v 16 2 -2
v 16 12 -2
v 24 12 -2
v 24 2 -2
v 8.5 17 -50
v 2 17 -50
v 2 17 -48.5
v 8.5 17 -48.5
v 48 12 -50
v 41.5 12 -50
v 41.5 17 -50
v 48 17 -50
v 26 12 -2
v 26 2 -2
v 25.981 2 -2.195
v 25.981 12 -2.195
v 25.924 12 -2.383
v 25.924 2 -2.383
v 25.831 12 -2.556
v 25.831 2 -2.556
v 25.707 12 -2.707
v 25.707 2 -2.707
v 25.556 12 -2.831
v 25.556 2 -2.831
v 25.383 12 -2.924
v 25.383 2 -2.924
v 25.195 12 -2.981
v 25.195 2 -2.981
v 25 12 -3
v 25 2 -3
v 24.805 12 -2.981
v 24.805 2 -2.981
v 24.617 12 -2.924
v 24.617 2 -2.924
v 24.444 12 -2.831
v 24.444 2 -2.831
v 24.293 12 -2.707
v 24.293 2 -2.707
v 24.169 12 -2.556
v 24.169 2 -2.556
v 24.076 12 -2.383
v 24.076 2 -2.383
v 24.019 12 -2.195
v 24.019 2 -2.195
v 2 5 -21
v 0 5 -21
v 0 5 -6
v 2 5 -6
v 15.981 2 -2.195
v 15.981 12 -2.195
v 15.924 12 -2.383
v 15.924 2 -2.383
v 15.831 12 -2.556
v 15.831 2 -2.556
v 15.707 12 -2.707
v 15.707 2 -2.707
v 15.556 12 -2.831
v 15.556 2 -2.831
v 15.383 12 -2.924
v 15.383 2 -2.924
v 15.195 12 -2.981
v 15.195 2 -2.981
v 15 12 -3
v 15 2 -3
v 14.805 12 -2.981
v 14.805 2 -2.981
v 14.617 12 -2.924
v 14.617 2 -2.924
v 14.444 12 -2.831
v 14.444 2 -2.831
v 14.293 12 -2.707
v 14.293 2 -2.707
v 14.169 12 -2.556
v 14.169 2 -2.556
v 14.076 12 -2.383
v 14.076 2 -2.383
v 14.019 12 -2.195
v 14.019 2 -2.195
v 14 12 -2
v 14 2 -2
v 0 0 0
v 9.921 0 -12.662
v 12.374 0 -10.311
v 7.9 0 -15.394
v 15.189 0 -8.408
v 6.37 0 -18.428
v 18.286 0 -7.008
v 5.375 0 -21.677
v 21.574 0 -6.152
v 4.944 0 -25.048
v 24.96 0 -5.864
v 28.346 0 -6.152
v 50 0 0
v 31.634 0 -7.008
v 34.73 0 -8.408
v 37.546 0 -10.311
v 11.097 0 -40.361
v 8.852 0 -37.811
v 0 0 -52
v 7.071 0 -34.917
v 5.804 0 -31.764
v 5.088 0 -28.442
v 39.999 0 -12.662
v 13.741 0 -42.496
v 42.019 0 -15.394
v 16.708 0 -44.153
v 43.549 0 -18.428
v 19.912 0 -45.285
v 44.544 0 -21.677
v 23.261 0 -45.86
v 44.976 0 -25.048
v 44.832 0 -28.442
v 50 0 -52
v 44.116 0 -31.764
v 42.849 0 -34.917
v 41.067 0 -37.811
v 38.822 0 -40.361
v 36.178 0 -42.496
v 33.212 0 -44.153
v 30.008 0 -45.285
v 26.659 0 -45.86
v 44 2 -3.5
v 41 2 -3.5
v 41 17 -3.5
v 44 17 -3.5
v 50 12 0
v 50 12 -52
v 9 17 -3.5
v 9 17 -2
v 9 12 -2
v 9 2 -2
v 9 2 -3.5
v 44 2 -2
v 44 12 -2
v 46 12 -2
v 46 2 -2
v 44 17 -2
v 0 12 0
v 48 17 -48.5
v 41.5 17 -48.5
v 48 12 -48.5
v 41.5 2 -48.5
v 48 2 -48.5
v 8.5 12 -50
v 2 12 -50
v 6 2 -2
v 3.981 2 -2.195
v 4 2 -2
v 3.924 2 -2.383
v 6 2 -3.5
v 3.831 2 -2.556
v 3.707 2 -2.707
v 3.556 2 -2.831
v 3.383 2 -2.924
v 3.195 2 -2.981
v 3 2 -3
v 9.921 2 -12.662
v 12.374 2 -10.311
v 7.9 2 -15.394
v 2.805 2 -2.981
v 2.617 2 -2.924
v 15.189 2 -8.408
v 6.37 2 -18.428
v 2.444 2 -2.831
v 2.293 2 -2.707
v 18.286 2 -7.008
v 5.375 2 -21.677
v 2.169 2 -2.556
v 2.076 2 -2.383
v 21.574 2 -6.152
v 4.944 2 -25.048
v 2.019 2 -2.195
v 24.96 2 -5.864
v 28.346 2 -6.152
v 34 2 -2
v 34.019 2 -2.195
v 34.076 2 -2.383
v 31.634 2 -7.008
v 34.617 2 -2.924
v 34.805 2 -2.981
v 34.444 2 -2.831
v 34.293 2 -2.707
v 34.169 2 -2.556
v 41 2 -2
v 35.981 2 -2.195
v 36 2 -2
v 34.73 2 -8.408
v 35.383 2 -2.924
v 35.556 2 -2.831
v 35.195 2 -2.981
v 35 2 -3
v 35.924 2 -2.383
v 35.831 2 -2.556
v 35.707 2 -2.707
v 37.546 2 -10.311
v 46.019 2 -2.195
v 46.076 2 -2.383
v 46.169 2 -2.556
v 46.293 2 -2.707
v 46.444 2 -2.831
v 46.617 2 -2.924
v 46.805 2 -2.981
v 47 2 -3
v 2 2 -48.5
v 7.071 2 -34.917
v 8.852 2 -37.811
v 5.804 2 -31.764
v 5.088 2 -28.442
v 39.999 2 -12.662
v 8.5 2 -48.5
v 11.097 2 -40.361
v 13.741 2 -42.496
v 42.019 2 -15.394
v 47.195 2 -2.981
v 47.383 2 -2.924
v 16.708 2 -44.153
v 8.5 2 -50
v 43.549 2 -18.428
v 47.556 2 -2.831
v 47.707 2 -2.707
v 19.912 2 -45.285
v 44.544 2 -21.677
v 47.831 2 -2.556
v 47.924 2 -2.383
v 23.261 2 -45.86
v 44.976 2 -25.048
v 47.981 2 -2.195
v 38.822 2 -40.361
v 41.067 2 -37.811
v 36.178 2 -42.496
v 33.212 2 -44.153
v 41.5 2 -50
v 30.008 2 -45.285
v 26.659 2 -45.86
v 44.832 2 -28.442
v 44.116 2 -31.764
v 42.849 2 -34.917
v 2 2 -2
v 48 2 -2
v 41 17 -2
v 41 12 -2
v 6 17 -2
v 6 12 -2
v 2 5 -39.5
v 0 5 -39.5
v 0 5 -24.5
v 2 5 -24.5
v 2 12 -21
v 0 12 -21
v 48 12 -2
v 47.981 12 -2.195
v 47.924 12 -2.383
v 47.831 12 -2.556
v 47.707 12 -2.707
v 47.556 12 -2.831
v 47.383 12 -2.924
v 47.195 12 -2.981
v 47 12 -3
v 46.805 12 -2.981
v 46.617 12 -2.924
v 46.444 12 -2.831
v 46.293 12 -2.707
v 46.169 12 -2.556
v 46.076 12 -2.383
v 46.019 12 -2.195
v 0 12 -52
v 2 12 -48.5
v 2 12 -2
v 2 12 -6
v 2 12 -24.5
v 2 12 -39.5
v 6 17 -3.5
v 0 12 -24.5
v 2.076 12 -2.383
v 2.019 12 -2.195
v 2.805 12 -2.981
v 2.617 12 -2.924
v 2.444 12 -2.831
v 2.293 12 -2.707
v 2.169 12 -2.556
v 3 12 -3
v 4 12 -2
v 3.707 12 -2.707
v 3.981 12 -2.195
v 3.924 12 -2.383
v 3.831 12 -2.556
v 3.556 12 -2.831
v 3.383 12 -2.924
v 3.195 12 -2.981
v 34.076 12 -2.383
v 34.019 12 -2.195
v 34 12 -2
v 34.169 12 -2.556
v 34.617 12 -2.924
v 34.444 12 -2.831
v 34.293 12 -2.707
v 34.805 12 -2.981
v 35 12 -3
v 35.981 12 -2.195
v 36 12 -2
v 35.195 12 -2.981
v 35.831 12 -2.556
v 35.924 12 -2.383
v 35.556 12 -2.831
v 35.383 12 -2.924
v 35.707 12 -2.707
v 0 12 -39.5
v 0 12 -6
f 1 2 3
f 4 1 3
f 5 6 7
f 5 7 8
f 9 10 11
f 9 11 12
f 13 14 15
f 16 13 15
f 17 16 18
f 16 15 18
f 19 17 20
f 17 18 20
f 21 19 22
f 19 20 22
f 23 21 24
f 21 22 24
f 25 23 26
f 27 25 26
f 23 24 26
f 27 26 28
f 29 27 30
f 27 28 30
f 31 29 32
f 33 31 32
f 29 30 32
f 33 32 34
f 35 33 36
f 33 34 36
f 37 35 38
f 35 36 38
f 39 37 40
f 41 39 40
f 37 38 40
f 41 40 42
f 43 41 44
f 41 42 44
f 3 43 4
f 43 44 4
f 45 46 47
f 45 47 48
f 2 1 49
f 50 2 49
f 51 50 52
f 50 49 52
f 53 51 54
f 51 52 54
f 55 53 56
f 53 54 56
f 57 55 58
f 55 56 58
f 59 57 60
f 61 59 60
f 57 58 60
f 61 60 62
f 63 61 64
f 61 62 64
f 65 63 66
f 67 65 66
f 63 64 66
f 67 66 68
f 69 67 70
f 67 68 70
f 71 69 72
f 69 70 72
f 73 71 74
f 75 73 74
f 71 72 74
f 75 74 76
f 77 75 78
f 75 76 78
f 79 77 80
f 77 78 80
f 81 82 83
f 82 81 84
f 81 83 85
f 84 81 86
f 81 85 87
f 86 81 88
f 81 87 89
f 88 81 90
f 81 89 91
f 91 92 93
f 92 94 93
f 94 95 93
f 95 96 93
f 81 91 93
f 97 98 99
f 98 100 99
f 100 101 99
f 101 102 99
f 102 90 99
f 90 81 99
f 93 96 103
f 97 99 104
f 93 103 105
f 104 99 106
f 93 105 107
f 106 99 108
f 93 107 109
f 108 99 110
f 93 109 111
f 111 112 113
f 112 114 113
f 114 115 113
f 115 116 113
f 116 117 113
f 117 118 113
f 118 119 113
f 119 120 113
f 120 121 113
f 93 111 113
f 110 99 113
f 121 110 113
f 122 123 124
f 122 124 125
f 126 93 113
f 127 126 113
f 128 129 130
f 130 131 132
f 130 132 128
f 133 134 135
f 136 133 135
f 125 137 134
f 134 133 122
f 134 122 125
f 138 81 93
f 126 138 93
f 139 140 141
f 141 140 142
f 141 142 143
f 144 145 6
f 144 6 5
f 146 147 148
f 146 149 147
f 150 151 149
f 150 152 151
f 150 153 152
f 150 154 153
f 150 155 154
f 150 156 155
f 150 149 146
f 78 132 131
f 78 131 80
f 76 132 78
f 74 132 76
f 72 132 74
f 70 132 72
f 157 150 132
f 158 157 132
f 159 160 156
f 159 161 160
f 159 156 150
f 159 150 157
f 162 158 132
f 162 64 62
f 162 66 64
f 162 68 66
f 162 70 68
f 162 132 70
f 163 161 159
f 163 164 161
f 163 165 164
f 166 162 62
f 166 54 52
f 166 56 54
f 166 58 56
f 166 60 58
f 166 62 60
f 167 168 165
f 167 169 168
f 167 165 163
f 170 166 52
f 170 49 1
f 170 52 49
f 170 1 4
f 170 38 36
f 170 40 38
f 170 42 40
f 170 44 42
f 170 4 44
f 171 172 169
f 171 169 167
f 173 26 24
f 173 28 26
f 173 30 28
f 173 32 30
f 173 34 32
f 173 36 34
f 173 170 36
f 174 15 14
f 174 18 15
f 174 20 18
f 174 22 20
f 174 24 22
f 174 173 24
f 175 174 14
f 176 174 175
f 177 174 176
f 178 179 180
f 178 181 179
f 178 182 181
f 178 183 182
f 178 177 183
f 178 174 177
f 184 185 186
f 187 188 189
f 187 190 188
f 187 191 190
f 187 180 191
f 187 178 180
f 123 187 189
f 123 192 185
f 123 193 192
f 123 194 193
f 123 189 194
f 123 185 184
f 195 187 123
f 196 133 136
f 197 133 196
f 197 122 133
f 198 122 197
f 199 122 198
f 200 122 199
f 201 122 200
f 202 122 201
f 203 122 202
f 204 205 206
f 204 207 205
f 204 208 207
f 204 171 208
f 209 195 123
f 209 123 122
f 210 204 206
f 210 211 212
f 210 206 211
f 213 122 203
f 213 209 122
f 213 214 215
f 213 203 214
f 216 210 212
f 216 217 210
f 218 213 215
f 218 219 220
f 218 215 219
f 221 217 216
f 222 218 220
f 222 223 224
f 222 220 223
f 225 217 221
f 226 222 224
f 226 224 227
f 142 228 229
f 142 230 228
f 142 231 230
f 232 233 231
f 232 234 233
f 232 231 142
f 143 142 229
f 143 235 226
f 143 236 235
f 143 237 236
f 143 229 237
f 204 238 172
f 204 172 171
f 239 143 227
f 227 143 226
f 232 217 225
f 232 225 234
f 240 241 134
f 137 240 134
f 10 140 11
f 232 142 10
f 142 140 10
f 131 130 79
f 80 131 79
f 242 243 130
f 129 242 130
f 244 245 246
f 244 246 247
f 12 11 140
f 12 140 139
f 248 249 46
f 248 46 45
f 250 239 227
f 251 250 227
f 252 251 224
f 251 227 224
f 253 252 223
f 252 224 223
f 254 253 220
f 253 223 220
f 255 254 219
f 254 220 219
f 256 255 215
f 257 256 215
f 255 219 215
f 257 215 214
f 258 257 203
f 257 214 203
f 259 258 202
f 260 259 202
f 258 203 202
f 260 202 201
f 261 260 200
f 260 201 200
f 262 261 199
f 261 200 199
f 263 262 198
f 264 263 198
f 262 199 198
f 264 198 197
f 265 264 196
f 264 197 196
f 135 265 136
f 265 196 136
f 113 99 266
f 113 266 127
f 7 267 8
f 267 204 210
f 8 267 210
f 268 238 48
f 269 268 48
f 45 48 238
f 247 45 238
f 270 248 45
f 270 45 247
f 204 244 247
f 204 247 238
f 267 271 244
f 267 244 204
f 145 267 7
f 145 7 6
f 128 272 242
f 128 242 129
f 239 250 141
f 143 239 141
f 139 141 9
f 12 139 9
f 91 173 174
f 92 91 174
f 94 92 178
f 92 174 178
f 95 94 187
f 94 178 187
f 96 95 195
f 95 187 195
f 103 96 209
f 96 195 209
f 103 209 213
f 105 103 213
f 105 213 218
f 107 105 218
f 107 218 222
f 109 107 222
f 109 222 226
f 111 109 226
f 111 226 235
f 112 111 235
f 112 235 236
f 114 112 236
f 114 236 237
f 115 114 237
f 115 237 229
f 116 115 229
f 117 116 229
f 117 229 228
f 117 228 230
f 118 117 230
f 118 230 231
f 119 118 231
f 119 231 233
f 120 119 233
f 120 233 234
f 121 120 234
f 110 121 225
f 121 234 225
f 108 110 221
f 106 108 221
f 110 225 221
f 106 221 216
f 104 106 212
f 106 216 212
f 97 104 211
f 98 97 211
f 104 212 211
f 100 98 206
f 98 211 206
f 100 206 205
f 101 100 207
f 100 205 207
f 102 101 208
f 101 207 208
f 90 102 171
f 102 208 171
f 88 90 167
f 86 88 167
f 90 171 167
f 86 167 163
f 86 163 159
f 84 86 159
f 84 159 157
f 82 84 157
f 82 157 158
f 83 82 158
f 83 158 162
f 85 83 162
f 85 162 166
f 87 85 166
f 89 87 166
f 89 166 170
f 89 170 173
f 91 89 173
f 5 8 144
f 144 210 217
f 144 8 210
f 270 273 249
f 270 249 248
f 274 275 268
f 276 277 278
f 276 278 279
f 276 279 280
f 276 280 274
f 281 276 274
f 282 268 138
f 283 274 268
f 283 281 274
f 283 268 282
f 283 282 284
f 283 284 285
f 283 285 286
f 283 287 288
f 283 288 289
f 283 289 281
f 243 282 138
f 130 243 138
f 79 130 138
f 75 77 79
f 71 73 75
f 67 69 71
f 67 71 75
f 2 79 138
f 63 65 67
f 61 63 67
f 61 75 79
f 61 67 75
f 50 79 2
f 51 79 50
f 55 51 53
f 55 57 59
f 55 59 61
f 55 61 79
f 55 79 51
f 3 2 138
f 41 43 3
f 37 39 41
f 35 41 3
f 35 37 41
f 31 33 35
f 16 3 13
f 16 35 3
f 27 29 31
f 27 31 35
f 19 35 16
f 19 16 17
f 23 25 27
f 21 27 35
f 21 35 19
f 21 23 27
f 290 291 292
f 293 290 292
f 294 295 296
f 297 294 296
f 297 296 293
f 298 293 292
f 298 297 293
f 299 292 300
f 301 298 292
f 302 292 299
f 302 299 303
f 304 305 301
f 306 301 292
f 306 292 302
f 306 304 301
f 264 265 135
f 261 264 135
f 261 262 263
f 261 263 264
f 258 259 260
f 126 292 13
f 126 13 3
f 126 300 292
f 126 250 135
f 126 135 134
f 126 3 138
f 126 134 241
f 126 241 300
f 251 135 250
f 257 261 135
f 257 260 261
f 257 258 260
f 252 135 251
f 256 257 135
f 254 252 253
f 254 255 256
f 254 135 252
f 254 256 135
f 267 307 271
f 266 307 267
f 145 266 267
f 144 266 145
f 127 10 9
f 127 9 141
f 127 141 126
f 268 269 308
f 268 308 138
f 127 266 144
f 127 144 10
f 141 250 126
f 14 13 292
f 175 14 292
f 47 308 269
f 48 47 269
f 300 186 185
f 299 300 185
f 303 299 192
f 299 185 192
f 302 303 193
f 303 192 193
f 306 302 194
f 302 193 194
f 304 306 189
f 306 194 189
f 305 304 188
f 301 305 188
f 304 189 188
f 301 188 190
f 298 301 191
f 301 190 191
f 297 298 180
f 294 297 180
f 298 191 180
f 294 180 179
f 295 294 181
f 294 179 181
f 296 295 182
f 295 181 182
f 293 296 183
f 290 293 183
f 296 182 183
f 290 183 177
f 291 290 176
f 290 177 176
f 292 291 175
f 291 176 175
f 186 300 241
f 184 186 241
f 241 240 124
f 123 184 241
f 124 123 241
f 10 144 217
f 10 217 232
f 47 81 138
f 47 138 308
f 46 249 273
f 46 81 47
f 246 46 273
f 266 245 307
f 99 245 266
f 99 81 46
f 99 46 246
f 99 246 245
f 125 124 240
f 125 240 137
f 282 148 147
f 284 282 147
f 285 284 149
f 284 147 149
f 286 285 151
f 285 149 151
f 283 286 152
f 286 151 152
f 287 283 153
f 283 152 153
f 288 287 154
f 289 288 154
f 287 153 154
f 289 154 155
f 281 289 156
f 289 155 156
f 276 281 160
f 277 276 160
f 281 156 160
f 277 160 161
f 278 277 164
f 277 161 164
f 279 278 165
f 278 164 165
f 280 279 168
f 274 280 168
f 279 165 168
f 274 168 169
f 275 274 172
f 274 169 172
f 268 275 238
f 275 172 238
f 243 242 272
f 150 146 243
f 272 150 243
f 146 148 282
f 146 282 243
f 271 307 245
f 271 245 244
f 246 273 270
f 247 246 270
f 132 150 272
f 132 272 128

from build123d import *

# Parameters (mm, degrees)
SKETCH2_W           = 50
SKETCH2_H           = 52
BOSS_EXTRUDE1_DEPTH = 12
SKETCH5_W           = 46
SKETCH5_H           = 48
CUT_EXTRUDE1_DEPTH  = 10
SKETCH7_W           = 2
SKETCH7_H           = 15
CUT_EXTRUDE2_DEPTH  = 7
SKETCH10_R          = 1
BOSS_EXTRUDE2_DEPTH = 10
SKETCH11_W          = 3
SKETCH11_H          = 1.5
SKETCH11_W_2        = 6.5
SKETCH11_H_2        = 1.499602214
BOSS_EXTRUDE3_DEPTH = 15
SKETCH12_R          = 20.034029424
CUT_EXTRUDE4_DEPTH  = 15


with BuildPart() as part:
    # Sketch2 → Boss-Extrude1 (new body)
    with BuildSketch(Plane(origin=(0, 0, 0), x_dir=(1, 0, 0), z_dir=(0, 1, 0))):
        with Locations((25, 26)):
            Rectangle(SKETCH2_W, SKETCH2_H)
    extrude(amount=BOSS_EXTRUDE1_DEPTH)

    # Sketch5 → Cut-Extrude1 (cut)
    with BuildSketch(Plane(origin=(0, 12, 0), x_dir=(1, 0, 0), z_dir=(0, 1, 0))):
        with Locations((25, 26)):
            Rectangle(SKETCH5_W, SKETCH5_H)
    extrude(amount=-CUT_EXTRUDE1_DEPTH, mode=Mode.SUBTRACT)

    # Sketch7 → Cut-Extrude2 (cut)
    with BuildSketch(Plane(origin=(0, 12, 0), x_dir=(1, 0, 0), z_dir=(0, 1, 0))):
        with Locations((1, 32)):
            Rectangle(SKETCH7_W, SKETCH7_H)
        with Locations((1, 13.5)):
            Rectangle(SKETCH7_W, SKETCH7_H)
    extrude(amount=-CUT_EXTRUDE2_DEPTH, mode=Mode.SUBTRACT)

    # Sketch10 → Boss-Extrude2 (add)
    with BuildSketch(Plane(origin=(0, 2, 0), x_dir=(1, 0, 0), z_dir=(0, 1, 0))):
        with Locations((25, 2)):
            Circle(SKETCH10_R)
        with Locations((35, 2)):
            Circle(SKETCH10_R)
        with Locations((15, 2)):
            Circle(SKETCH10_R)
        with Locations((3, 2)):
            Circle(SKETCH10_R)
        with Locations((47, 2)):
            Circle(SKETCH10_R)
    extrude(amount=BOSS_EXTRUDE2_DEPTH)

    # Sketch11 → Boss-Extrude3 (add)
    with BuildSketch(Plane(origin=(0, 2, 0), x_dir=(1, 0, 0), z_dir=(0, 1, 0))):
        with Locations((7.5, 2.75)):
            Rectangle(SKETCH11_W, SKETCH11_H)
        with Locations((42.5, 2.75)):
            Rectangle(SKETCH11_W, SKETCH11_H)
        with Locations((5.25, 49.250198893)):
            Rectangle(SKETCH11_W_2, SKETCH11_H_2)
        with Locations((44.75, 49.250198893)):
            Rectangle(SKETCH11_W_2, SKETCH11_H_2)
    extrude(amount=BOSS_EXTRUDE3_DEPTH)

    # Sketch12 → Cut-Extrude4 (cut)
    with BuildSketch(Plane(origin=(0, 2, 0), x_dir=(1, 0, 0), z_dir=(0, 1, 0))):
        with Locations(Location((24.959746772, 25.897804051, 0), (0, 0, 270))):
            Circle(SKETCH12_R)
    extrude(amount=-CUT_EXTRUDE4_DEPTH, mode=Mode.SUBTRACT)


solid = part.part
